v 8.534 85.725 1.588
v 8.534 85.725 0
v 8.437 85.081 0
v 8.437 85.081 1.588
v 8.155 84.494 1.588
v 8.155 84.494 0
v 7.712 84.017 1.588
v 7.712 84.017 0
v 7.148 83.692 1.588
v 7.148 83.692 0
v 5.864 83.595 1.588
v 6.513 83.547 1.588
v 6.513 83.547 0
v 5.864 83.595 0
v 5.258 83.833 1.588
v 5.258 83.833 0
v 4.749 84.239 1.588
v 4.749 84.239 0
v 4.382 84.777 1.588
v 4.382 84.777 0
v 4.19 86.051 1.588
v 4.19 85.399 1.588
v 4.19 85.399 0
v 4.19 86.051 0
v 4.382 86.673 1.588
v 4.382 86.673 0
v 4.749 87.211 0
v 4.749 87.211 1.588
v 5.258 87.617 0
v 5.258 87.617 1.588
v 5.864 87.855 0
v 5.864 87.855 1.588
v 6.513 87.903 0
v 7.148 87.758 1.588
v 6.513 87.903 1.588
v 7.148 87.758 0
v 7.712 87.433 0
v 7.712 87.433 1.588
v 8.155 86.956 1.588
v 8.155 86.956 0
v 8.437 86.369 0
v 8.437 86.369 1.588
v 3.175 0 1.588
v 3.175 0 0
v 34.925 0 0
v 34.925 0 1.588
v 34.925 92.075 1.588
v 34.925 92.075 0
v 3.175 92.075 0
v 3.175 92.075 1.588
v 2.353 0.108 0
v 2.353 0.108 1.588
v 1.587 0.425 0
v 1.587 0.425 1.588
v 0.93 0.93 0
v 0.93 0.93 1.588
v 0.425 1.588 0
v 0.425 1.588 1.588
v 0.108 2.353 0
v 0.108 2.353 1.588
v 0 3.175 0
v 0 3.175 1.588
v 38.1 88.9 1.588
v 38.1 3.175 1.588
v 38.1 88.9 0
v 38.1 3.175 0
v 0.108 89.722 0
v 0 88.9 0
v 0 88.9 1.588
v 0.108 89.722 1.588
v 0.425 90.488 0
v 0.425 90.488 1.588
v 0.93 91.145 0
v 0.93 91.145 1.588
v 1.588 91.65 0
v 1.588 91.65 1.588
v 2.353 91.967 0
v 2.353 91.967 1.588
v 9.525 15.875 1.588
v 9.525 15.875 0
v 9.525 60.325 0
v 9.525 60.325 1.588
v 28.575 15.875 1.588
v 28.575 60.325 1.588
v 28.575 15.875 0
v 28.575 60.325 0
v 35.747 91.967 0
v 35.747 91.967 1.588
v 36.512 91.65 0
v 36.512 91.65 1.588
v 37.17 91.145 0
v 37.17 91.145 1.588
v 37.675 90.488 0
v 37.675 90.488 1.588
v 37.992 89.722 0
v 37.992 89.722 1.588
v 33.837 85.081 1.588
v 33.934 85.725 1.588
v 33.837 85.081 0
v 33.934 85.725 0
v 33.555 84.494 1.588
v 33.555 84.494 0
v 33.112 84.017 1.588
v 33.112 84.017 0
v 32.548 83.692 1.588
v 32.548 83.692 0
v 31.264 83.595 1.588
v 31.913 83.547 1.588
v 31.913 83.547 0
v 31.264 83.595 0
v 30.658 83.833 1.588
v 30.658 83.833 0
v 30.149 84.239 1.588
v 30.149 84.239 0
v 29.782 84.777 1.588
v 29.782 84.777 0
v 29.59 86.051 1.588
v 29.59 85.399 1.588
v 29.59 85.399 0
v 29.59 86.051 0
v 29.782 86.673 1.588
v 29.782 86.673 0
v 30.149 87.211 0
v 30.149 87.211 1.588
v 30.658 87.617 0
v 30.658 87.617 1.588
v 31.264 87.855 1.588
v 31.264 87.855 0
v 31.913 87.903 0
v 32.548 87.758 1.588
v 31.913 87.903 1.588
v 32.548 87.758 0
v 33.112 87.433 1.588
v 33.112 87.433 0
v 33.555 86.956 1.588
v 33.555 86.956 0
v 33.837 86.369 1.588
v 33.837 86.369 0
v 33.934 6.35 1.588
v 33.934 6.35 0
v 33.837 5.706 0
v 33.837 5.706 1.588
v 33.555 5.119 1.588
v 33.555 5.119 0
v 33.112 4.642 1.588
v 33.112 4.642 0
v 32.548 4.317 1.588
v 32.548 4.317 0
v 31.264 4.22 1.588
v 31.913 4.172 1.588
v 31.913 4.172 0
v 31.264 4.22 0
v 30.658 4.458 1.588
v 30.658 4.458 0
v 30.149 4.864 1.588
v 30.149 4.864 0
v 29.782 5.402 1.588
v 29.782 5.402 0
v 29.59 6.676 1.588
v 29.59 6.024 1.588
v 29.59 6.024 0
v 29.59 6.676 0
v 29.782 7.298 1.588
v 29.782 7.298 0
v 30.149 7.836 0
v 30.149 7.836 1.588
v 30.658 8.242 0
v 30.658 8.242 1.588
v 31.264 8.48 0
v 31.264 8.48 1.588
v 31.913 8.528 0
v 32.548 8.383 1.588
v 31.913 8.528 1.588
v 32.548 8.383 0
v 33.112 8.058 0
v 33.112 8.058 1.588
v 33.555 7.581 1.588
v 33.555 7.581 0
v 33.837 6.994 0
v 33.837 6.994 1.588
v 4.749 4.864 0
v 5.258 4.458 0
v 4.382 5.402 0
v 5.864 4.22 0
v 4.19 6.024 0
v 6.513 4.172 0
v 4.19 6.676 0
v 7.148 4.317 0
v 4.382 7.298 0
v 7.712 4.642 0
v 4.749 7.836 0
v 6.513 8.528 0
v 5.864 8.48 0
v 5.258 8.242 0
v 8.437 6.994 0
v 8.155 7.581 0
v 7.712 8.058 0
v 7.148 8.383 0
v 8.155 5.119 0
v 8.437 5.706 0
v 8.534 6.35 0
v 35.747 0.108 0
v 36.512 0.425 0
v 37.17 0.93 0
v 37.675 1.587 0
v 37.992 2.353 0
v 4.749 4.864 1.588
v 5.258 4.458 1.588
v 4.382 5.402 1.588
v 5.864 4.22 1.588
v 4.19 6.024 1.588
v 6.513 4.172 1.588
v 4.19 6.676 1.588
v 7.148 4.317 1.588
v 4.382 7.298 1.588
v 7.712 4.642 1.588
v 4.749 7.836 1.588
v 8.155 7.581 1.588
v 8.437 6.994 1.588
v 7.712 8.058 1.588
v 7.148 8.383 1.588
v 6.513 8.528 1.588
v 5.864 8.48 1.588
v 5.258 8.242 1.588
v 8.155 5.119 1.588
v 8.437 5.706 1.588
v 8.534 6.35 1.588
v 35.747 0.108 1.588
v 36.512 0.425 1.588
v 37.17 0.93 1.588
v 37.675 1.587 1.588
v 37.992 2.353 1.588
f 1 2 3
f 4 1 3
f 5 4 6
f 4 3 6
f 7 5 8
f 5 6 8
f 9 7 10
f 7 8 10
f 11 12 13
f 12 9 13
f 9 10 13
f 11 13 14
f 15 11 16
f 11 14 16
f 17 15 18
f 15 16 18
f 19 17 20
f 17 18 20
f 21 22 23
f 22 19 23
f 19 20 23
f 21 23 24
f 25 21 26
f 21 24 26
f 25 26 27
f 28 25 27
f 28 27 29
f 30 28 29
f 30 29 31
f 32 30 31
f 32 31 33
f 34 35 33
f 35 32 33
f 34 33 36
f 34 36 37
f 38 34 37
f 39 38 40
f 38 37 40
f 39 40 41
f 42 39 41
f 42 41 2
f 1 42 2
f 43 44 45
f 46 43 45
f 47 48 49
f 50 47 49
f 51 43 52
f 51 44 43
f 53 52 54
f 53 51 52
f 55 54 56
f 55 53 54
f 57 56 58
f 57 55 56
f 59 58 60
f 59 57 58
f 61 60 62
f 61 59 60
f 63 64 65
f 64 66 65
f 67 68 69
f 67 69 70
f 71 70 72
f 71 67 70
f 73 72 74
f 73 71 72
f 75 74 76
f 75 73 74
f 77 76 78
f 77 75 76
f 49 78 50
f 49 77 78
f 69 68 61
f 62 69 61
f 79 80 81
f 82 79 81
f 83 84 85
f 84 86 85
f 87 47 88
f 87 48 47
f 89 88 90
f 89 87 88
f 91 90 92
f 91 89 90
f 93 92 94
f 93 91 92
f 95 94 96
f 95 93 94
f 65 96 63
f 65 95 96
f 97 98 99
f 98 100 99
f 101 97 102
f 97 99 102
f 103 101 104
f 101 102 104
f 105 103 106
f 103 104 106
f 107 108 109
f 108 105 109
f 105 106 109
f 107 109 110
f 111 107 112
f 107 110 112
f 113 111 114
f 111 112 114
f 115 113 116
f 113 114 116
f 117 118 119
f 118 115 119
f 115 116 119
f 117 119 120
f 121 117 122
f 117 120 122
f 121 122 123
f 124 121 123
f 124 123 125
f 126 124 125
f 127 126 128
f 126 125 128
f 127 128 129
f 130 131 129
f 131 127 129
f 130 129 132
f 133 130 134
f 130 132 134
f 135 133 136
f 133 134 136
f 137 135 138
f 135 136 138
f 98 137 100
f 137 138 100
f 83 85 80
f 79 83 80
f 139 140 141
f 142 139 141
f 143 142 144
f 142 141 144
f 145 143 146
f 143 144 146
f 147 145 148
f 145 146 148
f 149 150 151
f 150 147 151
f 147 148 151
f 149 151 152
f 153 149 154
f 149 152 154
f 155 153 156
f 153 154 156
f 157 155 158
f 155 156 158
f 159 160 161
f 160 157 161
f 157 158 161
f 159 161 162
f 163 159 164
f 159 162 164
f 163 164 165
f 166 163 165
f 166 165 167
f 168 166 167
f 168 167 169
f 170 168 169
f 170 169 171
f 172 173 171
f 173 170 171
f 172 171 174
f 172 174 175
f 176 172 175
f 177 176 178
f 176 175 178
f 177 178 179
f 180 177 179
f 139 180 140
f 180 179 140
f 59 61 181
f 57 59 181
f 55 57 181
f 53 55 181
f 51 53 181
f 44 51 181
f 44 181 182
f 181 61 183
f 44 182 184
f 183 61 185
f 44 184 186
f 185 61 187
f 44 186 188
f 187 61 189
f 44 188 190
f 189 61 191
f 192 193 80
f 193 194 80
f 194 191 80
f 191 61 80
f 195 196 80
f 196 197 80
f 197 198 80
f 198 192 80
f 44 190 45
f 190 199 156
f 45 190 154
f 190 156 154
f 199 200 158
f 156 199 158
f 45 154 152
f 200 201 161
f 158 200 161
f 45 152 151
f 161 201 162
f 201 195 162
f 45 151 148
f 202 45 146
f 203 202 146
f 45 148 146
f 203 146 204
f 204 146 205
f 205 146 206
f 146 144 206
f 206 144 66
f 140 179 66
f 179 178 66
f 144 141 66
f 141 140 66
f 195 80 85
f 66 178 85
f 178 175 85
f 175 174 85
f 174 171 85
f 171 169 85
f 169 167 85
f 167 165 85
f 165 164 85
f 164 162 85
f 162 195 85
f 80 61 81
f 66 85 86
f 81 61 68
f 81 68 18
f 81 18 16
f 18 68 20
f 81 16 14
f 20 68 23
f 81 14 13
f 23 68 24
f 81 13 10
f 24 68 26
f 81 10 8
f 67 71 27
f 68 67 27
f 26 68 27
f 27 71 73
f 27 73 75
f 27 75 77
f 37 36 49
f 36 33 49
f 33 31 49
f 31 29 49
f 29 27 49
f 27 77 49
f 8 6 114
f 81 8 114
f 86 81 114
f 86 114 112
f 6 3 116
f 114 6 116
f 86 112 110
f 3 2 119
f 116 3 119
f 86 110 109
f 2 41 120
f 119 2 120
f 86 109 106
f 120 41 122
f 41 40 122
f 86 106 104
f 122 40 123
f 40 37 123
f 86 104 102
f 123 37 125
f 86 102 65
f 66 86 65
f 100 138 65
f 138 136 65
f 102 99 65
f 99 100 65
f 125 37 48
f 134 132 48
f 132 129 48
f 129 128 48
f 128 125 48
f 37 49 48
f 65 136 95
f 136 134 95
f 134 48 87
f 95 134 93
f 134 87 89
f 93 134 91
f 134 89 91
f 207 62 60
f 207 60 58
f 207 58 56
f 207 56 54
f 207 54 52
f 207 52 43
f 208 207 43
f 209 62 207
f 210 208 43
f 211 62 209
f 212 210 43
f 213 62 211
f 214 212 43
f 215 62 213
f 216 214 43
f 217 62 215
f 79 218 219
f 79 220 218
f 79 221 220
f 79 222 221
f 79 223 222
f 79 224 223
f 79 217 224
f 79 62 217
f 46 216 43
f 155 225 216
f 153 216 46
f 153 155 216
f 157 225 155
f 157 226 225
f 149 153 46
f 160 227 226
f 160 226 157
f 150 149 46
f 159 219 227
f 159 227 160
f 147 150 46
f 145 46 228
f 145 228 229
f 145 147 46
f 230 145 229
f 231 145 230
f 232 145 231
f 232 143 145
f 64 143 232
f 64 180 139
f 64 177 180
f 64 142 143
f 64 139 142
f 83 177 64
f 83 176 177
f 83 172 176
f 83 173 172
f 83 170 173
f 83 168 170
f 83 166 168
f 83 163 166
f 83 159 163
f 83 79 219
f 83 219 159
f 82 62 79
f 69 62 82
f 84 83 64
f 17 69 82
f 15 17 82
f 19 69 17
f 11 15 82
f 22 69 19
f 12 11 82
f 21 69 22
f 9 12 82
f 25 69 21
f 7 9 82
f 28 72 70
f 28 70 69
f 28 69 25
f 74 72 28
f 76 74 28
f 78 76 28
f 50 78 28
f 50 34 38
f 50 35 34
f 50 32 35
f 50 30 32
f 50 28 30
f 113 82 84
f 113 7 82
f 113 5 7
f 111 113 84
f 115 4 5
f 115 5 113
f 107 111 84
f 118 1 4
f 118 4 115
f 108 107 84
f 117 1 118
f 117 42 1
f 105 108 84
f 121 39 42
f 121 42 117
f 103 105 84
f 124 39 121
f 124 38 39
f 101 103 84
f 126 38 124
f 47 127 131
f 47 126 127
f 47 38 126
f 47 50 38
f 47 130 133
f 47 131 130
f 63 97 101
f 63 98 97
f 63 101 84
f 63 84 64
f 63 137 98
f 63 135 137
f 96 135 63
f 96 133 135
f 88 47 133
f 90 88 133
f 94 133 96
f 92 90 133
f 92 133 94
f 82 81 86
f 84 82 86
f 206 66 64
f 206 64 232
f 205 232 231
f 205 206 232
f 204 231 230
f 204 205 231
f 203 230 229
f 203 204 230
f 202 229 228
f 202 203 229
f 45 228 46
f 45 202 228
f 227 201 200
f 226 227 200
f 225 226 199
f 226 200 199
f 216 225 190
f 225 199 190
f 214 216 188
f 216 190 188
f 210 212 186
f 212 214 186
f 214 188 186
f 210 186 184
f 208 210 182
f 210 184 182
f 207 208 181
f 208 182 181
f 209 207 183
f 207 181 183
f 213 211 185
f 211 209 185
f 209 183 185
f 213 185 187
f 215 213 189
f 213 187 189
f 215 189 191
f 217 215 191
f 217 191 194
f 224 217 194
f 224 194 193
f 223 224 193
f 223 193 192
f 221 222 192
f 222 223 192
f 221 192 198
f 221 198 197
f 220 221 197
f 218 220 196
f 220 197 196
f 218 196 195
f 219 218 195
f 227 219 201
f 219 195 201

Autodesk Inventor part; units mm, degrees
ref_plane "YZ Plane" through (0, 0, 0) normal (1, 0, 0) x (0, 1, 0)
ref_plane "XZ Plane" through (0, 0, 0) normal (0, 1, 0) x (-1, 0, 0)
ref_plane "XY Plane" through (0, 0, 0) normal (0, 0, 1) x (1, 0, 0)
sketch "Sketch1" plane through (0, 0, 0) normal (0, 0, 1) x (1, 0, 0)
  line L0 (3.175, 0) -> (34.925, 0)
  line L1 (38.1, 3.175) -> (38.1, 88.9)
  line L2 (34.925, 92.075) -> (3.175, 92.075)
  line L3 (0, 88.9) -> (0, 3.175)
  circle A0 centre (6.35, 85.725) radius 2.1844
  circle A1 centre (31.75, 85.725) radius 2.1844
  circle A2 centre (31.75, 6.35) radius 2.1844
  circle A3 centre (6.35, 6.35) radius 2.1844
  arc A4 (3.175, 92.075) -> (0, 88.9) centre (3.175, 88.9) ccw
  arc A5 (38.1, 88.9) -> (34.925, 92.075) centre (34.925, 88.9) ccw
  arc A6 (34.925, 0) -> (38.1, 3.175) centre (34.925, 3.175) ccw
  arc A7 (0, 3.175) -> (3.175, 0) centre (3.175, 3.175) ccw
  line L4 (9.525, 60.325) -> (28.575, 60.325)
  line L5 (28.575, 60.325) -> (28.575, 15.875)
  line L6 (28.575, 15.875) -> (9.525, 15.875)
  line L7 (9.525, 15.875) -> (9.525, 60.325)
  point P0 (0, 0)
  point P1 (38.1, 92.075)
  point P2 (38.1, 0)
  point P3 (0, 92.075)
  dimension "d0" = 38.1
  dimension "d1" = 92.075
  dimension "d2" = 4.3688
  dimension "d3" = 4.3688
  dimension "d4" = 4.3688
  dimension "d5" = 4.3688
  dimension "d6" = 0
  dimension "d7" = 25.4
  dimension "d8" = 0
  dimension "d9" = 79.375
  dimension "d10" = 0
  dimension "d11" = 79.375
  dimension "d12" = 6.35
  dimension "d13" = 6.35
  dimension "d14" = 3.175
  dimension "d16" = 25.4
  dimension "d17" = 9.525
  dimension "d18" = 9.525
  dimension "d19" = 9.525
extrude "Extrusion1" add sketch "Sketch1" along normal blind 1.5875
properties part number "odompoly"
